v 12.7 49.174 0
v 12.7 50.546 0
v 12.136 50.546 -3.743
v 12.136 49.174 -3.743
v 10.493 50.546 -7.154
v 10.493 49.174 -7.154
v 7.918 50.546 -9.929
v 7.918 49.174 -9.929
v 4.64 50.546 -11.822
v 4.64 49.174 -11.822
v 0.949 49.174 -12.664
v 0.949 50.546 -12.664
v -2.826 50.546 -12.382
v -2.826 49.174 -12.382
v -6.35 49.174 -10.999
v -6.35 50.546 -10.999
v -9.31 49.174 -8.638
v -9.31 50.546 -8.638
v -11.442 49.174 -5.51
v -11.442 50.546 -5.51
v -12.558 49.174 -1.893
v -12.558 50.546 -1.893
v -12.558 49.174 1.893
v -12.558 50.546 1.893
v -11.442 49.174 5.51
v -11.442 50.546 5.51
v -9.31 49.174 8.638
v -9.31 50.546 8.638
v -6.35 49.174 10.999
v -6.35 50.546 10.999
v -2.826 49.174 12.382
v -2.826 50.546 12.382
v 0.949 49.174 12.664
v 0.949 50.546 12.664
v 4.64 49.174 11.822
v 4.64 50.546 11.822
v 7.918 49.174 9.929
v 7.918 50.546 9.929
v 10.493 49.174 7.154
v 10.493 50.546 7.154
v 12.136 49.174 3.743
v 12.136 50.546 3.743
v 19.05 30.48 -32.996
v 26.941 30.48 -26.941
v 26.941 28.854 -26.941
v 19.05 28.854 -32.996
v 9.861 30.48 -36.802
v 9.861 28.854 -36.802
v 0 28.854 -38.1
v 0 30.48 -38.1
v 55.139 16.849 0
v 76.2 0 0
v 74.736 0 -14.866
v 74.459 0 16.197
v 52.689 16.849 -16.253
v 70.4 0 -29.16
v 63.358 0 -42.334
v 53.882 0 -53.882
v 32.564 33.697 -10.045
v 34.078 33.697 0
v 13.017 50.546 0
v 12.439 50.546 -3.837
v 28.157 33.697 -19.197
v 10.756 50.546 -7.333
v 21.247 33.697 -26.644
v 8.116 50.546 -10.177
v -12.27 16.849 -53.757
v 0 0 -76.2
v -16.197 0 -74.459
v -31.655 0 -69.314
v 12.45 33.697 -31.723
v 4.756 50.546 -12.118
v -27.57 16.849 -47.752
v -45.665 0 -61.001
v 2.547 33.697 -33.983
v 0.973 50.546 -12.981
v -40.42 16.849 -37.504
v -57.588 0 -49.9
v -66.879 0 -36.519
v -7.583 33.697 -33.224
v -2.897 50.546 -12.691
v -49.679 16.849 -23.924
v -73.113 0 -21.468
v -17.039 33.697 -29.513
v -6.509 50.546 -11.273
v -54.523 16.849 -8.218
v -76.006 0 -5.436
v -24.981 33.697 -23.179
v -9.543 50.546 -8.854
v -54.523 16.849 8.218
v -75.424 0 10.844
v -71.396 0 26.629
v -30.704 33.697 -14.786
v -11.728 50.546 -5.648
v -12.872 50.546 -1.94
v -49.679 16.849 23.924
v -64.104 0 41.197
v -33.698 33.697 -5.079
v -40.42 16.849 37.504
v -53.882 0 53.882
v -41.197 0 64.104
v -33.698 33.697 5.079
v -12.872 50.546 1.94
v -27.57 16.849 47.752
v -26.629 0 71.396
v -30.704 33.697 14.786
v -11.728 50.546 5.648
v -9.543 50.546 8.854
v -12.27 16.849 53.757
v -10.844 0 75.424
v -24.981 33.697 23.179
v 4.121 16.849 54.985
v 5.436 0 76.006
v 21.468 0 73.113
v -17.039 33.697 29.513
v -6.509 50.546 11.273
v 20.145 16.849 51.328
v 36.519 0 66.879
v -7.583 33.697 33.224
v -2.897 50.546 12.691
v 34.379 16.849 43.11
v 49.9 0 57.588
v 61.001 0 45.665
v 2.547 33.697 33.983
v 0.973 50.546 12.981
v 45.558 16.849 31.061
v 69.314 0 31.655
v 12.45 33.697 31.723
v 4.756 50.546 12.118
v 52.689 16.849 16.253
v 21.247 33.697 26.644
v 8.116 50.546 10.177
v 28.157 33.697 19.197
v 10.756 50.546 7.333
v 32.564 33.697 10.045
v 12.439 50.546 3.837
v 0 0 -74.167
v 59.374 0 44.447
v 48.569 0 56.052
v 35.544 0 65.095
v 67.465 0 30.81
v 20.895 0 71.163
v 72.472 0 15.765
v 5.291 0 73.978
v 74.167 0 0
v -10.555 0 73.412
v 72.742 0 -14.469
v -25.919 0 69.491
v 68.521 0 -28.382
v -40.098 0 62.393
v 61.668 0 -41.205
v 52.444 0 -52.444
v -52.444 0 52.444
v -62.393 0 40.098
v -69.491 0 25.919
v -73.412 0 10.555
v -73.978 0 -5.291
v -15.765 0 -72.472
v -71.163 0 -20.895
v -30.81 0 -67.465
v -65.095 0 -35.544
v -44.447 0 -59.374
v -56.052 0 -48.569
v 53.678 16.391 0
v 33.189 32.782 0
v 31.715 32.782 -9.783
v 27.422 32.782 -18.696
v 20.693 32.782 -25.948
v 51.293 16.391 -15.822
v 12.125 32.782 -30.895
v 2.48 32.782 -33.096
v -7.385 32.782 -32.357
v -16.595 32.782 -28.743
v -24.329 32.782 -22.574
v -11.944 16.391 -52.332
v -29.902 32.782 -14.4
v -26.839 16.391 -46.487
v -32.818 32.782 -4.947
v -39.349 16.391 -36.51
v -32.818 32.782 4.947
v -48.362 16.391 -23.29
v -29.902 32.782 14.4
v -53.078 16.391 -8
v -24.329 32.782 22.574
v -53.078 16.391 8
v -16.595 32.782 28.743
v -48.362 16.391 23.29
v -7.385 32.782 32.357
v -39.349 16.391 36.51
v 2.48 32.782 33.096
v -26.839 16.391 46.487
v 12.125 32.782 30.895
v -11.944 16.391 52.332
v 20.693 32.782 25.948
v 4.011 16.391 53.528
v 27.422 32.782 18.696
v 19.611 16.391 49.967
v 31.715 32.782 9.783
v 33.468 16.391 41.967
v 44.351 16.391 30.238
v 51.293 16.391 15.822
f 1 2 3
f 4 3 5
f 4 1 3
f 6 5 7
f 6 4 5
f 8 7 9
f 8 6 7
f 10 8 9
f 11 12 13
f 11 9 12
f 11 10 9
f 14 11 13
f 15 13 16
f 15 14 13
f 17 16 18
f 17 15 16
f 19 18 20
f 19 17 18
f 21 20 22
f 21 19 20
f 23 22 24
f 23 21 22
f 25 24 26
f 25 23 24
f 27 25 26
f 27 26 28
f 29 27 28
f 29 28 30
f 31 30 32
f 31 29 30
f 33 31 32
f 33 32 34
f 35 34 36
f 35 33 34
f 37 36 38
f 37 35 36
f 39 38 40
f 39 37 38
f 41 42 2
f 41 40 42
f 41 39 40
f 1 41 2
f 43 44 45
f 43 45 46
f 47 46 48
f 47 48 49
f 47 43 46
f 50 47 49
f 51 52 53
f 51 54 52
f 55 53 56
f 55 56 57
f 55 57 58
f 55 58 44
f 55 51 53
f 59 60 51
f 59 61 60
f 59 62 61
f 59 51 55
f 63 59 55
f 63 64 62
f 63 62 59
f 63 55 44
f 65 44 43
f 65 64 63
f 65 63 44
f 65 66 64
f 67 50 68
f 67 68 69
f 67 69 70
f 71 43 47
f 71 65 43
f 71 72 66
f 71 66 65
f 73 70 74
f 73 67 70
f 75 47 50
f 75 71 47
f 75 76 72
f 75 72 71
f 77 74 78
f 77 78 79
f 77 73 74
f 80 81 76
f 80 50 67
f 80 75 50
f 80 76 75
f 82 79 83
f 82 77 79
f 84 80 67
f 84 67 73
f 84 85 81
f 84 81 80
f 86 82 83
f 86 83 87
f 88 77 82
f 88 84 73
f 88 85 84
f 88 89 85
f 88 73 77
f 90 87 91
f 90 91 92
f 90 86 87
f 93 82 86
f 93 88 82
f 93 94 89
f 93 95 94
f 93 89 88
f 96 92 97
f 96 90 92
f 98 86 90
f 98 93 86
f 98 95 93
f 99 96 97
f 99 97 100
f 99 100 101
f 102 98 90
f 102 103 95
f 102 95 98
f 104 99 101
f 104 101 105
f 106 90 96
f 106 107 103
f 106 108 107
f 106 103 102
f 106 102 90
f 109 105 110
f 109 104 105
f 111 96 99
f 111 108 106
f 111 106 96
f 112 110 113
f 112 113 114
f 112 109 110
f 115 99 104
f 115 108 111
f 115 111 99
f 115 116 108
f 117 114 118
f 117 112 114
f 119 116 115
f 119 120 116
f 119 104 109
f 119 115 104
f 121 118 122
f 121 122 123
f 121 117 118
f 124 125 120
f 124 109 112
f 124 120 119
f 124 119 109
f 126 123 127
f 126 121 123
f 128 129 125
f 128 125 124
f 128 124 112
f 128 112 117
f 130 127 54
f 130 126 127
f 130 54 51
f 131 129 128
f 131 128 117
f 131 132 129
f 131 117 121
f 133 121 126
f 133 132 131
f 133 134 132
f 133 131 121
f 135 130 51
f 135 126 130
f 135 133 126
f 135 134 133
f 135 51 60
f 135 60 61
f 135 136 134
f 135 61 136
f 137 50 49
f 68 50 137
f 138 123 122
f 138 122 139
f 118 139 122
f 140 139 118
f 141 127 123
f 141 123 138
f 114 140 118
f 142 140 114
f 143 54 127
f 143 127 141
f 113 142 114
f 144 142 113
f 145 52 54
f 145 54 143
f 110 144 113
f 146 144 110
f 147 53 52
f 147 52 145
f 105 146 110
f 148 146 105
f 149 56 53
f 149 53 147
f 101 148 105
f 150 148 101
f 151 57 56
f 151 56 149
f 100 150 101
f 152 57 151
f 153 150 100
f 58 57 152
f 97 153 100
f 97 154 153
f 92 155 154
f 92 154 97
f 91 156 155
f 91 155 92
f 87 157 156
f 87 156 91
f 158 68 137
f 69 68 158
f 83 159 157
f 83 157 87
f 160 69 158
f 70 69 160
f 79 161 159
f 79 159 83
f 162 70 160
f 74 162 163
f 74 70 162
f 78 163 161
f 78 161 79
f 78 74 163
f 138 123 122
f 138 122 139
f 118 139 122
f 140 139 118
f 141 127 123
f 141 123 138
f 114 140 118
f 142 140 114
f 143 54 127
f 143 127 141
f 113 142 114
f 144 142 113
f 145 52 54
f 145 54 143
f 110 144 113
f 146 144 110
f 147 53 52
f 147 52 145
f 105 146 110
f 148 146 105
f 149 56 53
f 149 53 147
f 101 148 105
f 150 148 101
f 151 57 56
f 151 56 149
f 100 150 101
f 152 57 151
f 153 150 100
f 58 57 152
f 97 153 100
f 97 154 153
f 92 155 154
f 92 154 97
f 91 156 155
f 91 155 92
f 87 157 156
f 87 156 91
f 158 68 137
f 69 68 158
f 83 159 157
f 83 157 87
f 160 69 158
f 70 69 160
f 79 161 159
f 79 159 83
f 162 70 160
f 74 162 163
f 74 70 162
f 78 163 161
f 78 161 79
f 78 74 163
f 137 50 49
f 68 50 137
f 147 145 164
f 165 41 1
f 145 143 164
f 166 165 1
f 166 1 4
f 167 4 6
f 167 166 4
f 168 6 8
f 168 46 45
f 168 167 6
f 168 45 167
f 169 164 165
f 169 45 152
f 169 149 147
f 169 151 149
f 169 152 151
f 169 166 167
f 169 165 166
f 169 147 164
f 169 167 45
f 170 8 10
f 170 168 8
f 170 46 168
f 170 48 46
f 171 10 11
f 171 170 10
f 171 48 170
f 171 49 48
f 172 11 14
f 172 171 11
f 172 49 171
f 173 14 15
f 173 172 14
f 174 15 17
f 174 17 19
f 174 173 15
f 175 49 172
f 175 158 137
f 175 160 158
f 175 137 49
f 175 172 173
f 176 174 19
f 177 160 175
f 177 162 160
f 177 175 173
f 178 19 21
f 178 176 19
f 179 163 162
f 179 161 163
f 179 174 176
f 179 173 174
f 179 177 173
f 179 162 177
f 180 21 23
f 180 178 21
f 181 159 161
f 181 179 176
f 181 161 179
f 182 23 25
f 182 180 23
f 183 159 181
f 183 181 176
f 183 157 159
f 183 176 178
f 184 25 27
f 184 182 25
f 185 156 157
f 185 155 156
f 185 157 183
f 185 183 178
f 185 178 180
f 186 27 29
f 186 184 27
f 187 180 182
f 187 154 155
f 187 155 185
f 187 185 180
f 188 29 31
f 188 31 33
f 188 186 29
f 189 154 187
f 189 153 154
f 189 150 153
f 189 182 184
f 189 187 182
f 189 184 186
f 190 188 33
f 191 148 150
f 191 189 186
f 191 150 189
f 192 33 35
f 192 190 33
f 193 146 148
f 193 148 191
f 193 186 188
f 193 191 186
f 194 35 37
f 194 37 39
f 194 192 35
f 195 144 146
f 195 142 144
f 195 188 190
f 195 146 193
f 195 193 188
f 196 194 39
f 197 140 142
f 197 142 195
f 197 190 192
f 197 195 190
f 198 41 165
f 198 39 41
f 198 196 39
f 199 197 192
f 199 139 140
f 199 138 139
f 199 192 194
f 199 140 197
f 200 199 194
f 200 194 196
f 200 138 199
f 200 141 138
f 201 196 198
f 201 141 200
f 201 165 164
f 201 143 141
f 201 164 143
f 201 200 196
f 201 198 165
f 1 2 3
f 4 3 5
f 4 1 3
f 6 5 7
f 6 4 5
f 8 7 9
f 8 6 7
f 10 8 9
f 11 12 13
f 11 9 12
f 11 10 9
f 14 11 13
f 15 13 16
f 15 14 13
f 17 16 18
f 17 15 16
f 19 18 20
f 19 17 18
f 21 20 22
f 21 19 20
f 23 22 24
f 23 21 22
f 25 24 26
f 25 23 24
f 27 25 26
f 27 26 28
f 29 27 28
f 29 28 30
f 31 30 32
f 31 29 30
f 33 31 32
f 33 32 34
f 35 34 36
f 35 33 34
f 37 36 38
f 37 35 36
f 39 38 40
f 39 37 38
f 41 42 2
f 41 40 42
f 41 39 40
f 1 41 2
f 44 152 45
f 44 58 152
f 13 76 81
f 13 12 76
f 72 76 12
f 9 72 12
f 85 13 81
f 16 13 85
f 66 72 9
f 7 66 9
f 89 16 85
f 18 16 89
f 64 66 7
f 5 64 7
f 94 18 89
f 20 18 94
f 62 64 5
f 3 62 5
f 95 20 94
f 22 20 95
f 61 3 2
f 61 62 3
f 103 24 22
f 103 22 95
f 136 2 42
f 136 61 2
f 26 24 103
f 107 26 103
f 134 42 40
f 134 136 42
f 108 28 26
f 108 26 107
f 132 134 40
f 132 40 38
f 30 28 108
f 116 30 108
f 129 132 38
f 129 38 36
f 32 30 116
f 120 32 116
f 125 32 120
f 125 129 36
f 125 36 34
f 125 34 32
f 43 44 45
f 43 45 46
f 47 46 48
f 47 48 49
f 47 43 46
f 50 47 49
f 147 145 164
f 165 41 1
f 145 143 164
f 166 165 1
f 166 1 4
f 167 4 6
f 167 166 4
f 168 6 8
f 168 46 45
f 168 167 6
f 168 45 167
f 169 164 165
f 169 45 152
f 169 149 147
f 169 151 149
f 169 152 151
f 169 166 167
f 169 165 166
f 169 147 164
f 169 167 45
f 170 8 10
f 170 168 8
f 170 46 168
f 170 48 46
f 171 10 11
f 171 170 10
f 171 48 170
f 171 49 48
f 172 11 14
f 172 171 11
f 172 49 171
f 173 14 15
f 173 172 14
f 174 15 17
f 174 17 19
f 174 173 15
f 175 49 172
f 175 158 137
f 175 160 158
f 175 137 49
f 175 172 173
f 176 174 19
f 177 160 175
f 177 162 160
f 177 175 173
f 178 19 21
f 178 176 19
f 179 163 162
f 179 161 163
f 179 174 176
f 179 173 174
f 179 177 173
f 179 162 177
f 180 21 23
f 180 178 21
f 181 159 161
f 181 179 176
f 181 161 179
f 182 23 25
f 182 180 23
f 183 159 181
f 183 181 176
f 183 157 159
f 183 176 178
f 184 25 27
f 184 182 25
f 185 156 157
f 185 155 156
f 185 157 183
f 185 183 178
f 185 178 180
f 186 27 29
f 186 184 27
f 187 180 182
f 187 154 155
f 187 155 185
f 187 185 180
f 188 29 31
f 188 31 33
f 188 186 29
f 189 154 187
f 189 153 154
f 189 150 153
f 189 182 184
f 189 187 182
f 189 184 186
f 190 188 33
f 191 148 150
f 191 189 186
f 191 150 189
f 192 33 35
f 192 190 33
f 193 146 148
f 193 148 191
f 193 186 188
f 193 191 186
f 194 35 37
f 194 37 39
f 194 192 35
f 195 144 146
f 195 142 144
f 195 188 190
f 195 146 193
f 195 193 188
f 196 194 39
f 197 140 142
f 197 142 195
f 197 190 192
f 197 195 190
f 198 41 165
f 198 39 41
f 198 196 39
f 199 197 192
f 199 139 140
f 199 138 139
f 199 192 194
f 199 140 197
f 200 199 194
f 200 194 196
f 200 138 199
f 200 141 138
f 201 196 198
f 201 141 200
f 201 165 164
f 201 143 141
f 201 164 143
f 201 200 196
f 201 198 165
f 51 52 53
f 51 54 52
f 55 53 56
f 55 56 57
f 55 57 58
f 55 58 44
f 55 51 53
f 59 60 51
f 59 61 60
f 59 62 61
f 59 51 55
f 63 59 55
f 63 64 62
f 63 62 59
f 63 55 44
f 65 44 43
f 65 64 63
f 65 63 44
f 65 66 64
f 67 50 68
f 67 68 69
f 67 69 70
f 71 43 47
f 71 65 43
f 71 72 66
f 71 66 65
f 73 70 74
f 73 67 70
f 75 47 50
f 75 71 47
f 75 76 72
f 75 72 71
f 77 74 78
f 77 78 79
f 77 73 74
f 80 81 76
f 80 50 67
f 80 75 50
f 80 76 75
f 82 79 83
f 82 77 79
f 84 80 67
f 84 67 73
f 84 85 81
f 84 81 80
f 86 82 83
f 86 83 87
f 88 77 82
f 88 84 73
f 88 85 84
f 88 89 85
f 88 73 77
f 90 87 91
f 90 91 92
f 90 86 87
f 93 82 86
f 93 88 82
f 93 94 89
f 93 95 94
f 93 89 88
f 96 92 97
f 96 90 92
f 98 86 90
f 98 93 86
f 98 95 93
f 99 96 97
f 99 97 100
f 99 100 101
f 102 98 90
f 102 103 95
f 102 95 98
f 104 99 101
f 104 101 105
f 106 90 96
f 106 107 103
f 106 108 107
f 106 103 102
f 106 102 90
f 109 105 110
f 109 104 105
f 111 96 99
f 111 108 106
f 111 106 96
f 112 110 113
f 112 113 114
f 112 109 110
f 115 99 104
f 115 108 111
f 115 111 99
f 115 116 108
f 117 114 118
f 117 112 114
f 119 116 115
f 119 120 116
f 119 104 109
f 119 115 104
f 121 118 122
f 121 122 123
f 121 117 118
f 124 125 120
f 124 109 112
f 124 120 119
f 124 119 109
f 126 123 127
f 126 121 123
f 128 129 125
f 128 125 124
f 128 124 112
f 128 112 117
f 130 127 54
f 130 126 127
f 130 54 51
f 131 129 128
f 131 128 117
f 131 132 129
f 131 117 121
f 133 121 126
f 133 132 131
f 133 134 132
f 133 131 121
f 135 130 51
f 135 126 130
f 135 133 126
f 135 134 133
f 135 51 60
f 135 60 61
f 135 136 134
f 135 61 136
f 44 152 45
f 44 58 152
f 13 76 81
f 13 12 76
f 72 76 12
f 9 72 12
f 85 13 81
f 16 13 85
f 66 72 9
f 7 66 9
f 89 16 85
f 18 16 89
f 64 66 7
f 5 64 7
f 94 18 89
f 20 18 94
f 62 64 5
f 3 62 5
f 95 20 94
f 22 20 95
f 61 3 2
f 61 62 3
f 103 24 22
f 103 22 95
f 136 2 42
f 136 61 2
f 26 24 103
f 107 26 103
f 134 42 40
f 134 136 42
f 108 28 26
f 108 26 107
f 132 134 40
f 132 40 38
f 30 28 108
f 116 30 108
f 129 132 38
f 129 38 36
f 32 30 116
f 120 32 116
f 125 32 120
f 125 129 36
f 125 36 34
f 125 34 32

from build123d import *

# Parameters (mm, degrees)
CUT_EXTRUDE1_DEPTH = 76.2
CUT_EXTRUDE2_DEPTH = 0.254


# Read off the part's stored shape, not the designer's step: Revolve2
with BuildPart() as part:
    # Revolve2 outline → Revolve2 (revolve)
    with BuildSketch(Plane.XY):
        Polygon((12.7, 49.173606444), (74.167008055, 0), (76.2, 0), (12.7, 50.8), align=None)
    revolve(axis=Axis((0, 0, 0), (0, 1, 0)))


with BuildPart() as body_2:
    # Revolve2 2 outline → Revolve2 2 (revolve)
    with BuildSketch(Plane.XY):
        Polygon((12.7, 50.8), (12.7, 49.173606444), (74.167008055, 0), (76.2, 0), align=None)
    revolve(axis=Axis((0, 0, 0), (0, 1, 0)))


with BuildPart() as cut_extrude1_tool:
    # Sketch2 → Cut-Extrude1 (new, symmetric)
    with BuildSketch(Plane(origin=(0, 0, 0), x_dir=(1, 0, 0), z_dir=(0, 1, 0))):
        with BuildLine():
            Line((0, 38.1), (0, 76.2))
            ThreePointArc((0, 76.2), (29.160477546, 70.399620377), (53.881536726, 53.881536726))
            Line((53.881536726, 53.881536726), (26.940768363, 26.940768363))
            ThreePointArc((26.940768363, 26.940768363), (14.580238773, 35.199810189), (0, 38.1))
        make_face()
    extrude(amount=CUT_EXTRUDE1_DEPTH, both=True)


with BuildPart() as part_1:
    add(part.part)

    # Cut-Extrude1: cut by cut_extrude1_tool
    add(cut_extrude1_tool.part, mode=Mode.SUBTRACT)


with BuildPart() as body_2_1:
    add(body_2.part)

    # Cut-Extrude1: cut by cut_extrude1_tool
    add(cut_extrude1_tool.part, mode=Mode.SUBTRACT)


with BuildPart() as cut_extrude2_tool:
    # 3DSketch1 → Cut-Extrude2 (new body)
    with BuildSketch(Plane(origin=(-15.875, 50.8, 15.875), x_dir=(0.7071067811865501, 2.4725865491083076e-15, -0.7071067811865451), z_dir=(0, -1, 0))):
        Polygon((0, 0), (22.450640303, 22.450640303), (44.901280605, 0), (22.450640303, -22.450640303), align=None)
    extrude(amount=CUT_EXTRUDE2_DEPTH)


with BuildPart() as part_2:
    add(part_1.part)

    # Cut-Extrude2: cut by cut_extrude2_tool
    add(cut_extrude2_tool.part, mode=Mode.SUBTRACT)


with BuildPart() as body_2_2:
    add(body_2_1.part)

    # Cut-Extrude2: cut by cut_extrude2_tool
    add(cut_extrude2_tool.part, mode=Mode.SUBTRACT)


solid = Compound([part_2.part, body_2_2.part])
